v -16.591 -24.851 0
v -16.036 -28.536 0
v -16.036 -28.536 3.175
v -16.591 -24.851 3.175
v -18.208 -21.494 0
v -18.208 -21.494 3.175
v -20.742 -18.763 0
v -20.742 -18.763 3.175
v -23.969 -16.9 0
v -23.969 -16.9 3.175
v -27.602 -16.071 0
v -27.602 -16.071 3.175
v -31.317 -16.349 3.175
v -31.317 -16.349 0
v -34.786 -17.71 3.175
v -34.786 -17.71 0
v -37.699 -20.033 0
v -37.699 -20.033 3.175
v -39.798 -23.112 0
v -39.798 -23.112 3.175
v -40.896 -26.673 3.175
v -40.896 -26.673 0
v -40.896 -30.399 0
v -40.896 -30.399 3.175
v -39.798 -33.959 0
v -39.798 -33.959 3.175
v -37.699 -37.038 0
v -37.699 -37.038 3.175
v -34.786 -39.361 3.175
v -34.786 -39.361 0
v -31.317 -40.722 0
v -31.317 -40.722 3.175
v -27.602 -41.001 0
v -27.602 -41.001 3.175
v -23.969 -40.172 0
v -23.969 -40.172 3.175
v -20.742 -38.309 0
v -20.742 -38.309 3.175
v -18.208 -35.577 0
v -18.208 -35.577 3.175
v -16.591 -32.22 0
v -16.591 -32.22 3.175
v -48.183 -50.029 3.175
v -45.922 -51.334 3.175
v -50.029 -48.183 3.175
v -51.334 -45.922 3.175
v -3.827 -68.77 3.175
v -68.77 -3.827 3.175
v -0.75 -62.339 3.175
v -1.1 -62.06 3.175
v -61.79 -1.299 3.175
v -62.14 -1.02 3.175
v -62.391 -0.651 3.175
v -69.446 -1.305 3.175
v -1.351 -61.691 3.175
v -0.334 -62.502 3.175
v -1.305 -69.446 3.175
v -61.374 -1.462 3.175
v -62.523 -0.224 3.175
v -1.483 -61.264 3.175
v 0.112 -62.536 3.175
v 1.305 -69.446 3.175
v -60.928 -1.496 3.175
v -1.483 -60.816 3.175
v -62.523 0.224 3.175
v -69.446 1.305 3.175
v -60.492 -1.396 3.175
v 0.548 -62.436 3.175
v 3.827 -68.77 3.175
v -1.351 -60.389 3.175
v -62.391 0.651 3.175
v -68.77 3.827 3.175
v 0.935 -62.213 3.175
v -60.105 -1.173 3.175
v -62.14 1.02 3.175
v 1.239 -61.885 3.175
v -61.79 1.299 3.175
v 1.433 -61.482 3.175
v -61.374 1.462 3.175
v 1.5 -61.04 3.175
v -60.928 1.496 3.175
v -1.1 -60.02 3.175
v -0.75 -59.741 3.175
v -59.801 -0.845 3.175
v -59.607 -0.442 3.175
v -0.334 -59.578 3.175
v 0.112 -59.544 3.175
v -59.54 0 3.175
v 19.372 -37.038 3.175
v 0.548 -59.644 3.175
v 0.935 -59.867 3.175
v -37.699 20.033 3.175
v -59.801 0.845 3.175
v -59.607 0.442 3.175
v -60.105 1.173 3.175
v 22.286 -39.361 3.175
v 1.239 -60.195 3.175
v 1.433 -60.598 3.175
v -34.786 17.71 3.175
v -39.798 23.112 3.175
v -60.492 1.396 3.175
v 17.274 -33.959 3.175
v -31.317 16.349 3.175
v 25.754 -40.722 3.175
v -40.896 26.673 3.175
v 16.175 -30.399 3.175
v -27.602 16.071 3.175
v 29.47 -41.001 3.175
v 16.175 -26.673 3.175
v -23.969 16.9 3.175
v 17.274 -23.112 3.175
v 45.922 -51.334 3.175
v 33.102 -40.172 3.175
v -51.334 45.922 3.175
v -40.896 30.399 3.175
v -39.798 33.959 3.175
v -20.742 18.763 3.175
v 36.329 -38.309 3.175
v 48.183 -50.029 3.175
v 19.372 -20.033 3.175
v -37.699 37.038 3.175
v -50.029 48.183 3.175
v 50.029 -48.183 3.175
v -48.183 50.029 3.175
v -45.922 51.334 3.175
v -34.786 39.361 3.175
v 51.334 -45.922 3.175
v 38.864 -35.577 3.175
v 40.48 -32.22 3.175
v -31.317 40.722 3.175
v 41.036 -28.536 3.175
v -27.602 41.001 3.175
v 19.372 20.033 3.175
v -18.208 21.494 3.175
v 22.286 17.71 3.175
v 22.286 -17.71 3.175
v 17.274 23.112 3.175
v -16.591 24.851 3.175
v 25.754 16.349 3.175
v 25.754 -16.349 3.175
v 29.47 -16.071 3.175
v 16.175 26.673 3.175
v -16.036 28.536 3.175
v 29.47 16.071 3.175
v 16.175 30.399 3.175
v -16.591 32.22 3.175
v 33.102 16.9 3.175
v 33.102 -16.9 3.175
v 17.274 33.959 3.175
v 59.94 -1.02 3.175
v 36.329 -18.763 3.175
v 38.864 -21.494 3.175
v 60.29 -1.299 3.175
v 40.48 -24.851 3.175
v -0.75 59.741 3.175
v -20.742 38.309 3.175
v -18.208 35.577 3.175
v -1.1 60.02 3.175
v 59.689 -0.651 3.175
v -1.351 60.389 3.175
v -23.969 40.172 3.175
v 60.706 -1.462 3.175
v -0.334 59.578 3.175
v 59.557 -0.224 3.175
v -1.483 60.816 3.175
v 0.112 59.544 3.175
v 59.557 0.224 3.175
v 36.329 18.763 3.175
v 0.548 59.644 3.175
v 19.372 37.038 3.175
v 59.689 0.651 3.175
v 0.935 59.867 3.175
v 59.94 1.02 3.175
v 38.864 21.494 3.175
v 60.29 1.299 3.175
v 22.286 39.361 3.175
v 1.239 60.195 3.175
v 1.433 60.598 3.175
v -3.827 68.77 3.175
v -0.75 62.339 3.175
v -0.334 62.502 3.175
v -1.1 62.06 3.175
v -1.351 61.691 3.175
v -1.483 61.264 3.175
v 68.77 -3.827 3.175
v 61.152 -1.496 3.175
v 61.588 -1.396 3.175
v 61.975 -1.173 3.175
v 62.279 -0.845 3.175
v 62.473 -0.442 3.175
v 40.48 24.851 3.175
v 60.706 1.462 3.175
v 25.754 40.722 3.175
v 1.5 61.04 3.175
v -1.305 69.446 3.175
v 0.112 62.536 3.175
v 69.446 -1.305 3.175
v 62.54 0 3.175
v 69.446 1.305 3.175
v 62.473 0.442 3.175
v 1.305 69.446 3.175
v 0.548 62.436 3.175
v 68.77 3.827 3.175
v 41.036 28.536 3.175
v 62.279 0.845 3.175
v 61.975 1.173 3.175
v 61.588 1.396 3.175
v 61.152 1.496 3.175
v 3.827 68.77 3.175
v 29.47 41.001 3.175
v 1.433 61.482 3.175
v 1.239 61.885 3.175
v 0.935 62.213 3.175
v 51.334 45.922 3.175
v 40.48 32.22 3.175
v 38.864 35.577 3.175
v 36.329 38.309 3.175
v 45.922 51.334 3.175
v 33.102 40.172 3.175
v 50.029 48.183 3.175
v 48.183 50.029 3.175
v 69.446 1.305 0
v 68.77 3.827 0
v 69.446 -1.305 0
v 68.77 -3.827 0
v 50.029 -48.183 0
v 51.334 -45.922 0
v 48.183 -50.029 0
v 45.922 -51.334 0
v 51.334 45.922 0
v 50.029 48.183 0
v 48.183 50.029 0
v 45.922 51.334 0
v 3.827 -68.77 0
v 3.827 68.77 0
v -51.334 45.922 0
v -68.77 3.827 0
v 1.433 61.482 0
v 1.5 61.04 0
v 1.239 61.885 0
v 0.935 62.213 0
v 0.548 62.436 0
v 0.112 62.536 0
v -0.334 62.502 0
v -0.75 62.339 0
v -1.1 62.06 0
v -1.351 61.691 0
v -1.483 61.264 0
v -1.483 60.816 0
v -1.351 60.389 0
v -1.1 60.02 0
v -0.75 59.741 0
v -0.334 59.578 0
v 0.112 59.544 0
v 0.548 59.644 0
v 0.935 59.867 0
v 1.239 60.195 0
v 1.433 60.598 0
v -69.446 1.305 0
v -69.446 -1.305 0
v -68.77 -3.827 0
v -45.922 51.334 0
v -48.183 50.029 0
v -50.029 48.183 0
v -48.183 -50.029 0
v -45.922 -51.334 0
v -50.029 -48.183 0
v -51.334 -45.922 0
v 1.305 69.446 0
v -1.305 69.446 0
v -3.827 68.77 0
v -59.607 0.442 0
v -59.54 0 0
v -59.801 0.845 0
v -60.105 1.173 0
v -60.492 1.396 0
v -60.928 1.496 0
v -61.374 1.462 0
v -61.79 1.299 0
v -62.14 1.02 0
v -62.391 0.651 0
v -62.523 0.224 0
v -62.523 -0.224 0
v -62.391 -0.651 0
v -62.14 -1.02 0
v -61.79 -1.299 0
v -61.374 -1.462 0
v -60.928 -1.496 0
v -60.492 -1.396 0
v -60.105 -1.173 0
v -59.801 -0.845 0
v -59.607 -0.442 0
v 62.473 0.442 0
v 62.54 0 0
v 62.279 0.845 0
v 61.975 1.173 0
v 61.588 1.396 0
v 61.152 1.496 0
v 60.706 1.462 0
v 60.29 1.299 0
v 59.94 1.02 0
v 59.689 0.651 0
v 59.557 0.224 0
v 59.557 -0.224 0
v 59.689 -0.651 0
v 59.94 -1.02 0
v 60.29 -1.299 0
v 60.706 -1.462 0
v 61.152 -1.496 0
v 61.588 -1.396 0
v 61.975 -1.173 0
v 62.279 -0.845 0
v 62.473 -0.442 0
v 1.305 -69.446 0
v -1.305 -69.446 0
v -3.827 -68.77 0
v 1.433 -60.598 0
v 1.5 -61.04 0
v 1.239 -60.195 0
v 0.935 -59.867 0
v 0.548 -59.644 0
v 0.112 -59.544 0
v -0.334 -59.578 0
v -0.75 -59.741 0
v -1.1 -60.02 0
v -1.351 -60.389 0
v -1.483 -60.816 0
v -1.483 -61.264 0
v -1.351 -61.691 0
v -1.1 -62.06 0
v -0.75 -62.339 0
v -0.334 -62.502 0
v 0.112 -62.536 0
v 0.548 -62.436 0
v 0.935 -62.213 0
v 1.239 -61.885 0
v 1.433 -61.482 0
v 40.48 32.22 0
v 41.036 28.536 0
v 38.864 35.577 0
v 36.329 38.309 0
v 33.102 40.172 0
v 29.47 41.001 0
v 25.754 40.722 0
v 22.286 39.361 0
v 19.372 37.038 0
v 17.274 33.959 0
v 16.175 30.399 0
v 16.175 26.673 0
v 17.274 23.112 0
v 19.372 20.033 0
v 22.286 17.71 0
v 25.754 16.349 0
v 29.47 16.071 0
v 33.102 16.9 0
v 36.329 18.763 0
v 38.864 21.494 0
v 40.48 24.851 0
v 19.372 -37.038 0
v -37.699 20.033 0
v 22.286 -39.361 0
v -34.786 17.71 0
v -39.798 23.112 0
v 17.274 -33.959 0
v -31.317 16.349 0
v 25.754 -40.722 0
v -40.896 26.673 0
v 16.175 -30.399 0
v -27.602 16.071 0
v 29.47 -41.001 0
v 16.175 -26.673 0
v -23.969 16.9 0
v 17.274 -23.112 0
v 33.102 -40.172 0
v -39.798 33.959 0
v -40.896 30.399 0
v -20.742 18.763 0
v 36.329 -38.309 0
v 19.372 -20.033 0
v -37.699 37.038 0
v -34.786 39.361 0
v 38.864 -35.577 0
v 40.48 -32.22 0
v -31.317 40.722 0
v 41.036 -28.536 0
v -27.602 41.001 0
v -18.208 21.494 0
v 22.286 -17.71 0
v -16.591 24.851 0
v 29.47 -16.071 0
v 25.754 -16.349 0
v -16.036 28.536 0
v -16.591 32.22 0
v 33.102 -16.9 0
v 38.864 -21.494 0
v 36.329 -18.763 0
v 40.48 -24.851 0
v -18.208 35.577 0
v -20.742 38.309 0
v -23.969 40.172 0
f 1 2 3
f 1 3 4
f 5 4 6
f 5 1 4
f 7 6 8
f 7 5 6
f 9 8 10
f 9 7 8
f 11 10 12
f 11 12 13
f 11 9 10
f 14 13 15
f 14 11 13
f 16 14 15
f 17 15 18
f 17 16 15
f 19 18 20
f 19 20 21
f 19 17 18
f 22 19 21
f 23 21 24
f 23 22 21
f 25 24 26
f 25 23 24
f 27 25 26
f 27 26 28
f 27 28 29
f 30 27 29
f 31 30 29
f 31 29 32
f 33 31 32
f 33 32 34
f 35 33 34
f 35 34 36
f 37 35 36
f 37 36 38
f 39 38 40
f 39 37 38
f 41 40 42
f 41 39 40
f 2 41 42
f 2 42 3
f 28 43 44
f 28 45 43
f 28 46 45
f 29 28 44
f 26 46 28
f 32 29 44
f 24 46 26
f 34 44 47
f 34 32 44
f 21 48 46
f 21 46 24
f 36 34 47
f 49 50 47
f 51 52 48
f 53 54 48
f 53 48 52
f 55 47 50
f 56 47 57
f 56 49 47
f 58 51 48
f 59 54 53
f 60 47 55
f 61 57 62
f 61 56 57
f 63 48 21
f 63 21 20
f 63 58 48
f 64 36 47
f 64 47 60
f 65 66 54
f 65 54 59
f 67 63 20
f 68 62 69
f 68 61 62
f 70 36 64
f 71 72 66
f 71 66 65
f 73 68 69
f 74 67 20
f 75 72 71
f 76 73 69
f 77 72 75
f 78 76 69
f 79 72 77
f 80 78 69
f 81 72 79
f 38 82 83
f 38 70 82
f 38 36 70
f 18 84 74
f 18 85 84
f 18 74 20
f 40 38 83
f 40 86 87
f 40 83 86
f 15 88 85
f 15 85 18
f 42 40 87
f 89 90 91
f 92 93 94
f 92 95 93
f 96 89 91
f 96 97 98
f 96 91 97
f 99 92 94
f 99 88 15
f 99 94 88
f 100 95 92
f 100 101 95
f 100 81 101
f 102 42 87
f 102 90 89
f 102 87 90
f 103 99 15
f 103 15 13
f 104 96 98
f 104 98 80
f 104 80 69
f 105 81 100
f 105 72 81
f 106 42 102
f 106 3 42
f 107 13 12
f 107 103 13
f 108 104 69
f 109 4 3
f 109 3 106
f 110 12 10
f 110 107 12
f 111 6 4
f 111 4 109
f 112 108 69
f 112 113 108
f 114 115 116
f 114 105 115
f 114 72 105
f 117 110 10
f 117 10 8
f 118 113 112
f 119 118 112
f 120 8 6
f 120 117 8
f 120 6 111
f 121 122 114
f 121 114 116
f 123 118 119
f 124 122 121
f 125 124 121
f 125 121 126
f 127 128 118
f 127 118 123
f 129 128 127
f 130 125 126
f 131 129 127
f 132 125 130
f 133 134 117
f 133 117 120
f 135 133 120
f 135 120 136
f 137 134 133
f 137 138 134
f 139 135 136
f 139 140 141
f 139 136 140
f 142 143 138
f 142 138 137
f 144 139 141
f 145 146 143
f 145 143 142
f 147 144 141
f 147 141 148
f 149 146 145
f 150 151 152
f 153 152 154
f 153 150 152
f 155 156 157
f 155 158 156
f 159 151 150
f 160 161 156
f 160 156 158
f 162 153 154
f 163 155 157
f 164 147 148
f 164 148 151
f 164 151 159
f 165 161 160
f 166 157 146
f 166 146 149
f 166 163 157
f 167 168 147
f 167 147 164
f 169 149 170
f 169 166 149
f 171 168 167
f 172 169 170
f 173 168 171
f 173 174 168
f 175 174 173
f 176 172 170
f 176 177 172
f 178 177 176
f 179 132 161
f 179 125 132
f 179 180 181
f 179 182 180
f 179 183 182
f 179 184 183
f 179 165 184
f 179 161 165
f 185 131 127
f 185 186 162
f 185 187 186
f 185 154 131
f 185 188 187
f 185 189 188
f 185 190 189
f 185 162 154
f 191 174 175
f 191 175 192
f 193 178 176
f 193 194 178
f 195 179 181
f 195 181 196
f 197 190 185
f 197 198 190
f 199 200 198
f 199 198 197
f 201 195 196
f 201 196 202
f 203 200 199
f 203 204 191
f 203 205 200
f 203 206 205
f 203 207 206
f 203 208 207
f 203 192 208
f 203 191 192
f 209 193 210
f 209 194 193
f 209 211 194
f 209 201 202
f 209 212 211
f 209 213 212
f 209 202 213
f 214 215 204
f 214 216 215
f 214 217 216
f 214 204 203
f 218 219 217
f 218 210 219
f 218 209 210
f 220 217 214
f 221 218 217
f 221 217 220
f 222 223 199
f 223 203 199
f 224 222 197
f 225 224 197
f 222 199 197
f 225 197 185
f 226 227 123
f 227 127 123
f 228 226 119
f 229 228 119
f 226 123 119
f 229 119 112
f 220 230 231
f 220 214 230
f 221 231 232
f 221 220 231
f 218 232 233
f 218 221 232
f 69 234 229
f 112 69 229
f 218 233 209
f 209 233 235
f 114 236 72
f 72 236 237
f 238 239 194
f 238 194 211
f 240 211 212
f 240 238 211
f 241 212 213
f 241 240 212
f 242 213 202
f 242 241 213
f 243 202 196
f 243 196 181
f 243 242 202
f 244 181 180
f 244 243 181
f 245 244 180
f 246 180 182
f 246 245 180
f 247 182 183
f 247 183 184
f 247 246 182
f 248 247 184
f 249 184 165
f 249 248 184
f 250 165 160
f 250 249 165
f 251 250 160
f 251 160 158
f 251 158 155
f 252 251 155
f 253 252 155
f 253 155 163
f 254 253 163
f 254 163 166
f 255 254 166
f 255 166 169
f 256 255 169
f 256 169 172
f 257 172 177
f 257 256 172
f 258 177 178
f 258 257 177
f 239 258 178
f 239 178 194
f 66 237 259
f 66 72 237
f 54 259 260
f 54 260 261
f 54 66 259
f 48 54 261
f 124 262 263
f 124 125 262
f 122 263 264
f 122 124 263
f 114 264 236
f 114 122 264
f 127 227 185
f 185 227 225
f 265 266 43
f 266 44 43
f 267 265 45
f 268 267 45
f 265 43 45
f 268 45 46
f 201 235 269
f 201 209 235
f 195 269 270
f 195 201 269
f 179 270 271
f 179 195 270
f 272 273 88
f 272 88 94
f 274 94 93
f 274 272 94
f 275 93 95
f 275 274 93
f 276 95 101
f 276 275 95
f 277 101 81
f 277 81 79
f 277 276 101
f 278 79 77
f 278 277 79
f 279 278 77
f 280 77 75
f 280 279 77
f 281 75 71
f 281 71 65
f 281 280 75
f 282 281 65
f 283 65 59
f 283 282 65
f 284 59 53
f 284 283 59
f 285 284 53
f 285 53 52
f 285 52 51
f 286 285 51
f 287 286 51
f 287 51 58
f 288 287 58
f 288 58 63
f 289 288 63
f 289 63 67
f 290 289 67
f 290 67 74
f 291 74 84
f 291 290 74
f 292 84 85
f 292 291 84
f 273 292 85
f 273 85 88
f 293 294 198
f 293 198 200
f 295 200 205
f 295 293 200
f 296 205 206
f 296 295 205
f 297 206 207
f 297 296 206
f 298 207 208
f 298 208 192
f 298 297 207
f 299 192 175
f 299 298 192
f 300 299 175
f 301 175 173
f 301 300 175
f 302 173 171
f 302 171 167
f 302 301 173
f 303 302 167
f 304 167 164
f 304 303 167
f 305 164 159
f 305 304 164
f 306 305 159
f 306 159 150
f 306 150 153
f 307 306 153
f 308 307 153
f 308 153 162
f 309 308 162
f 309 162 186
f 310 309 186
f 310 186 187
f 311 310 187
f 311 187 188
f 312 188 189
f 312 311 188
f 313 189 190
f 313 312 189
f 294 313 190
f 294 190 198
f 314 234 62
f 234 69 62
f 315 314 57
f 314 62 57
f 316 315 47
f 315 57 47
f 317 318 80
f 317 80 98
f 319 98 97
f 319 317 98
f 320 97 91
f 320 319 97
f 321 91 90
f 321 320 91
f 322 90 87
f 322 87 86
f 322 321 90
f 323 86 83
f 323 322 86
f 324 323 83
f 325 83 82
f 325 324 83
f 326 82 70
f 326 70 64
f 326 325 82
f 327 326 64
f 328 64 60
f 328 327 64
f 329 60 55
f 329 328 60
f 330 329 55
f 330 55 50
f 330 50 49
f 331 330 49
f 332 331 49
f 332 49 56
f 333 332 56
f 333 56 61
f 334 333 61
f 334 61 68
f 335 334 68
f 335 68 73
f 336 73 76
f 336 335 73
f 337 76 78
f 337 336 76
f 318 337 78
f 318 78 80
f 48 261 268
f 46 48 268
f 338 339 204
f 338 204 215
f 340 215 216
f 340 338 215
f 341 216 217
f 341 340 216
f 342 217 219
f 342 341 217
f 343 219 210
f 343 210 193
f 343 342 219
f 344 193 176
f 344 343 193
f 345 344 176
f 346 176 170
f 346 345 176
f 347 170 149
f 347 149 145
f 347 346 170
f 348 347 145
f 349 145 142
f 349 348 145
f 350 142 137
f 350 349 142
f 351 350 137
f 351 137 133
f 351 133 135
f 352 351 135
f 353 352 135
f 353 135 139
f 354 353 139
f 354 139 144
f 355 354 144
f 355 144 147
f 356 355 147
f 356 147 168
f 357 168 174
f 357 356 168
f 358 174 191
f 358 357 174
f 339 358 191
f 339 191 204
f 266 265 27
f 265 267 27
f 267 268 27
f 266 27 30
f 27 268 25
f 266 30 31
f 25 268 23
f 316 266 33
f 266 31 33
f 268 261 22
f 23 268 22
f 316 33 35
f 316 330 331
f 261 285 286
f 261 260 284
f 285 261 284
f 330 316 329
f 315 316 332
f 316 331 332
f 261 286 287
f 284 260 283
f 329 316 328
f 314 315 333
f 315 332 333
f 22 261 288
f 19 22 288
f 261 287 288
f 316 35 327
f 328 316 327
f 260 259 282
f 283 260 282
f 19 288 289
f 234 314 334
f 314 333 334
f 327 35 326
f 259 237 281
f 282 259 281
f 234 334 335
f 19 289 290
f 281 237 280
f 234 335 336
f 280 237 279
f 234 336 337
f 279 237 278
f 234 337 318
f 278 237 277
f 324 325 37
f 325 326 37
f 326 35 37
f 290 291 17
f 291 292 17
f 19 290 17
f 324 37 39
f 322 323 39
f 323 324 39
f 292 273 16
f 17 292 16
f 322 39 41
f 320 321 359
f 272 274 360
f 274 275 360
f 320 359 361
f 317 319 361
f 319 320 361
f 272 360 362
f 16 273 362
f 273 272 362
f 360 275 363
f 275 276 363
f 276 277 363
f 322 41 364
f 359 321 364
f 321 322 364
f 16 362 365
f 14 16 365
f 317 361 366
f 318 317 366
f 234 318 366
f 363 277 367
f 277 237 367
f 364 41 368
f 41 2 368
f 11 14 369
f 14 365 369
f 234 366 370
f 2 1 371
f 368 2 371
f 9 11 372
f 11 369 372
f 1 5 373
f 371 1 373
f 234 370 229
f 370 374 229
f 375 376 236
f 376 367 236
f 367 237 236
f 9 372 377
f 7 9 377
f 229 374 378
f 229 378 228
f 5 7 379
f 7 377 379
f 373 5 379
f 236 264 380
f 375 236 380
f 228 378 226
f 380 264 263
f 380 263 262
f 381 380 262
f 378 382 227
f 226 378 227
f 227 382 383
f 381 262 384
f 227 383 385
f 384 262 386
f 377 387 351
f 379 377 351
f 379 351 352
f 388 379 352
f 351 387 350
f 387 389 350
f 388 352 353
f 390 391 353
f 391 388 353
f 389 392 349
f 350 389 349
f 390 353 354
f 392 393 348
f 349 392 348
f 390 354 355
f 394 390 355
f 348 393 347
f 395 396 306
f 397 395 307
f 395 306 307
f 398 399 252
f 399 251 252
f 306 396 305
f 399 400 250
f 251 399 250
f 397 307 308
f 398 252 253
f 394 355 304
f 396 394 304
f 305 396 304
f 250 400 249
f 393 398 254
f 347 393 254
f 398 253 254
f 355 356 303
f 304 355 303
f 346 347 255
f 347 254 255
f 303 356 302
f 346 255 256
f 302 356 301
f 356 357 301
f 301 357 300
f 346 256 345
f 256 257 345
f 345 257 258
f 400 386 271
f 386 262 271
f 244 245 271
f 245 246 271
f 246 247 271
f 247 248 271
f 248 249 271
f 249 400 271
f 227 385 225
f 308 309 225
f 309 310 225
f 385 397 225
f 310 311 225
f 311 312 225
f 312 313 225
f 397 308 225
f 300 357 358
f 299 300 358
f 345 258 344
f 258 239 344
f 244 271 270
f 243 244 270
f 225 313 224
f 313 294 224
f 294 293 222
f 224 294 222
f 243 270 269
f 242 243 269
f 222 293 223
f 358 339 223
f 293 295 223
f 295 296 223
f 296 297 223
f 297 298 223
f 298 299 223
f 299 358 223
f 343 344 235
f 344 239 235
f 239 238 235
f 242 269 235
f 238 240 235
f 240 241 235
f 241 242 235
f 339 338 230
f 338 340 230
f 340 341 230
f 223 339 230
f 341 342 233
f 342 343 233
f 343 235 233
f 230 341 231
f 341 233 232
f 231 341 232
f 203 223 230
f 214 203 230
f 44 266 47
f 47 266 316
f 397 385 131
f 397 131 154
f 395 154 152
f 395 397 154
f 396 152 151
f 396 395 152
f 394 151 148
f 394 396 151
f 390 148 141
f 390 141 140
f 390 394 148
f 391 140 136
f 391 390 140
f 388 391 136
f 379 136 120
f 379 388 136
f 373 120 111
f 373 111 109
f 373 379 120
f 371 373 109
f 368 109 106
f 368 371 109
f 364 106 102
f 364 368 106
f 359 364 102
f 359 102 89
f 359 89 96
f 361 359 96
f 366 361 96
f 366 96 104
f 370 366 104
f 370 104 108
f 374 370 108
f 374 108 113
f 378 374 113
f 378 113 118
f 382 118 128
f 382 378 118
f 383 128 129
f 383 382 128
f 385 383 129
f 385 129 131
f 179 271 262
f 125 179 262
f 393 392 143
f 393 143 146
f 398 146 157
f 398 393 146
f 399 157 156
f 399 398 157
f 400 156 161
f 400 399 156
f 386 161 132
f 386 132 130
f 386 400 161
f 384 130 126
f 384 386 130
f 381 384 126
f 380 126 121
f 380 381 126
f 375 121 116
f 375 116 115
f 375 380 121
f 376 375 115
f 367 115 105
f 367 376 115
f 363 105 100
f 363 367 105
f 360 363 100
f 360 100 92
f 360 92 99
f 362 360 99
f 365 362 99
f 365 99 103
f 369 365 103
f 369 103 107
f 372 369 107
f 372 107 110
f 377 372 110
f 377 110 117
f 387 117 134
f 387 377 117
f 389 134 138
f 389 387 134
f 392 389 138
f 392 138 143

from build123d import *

# Parameters (mm, degrees)
SKETCH1_R           = 1.5
SKETCH1_R_2         = 12.5
BOSS_EXTRUDE1_DEPTH = 3.175
FILLET1_R           = 10
FILLET2_R           = 10


with BuildPart() as part:
    # Sketch1 → Boss-Extrude1 (new body)
    with BuildSketch(Plane.XY):
        Polygon((70.355493019, 0), (49.748846207, 49.748846207), (0, 70.355493019), (-49.748846207, 49.748846207), (-70.355493019, 0), (-49.748846207, -49.748846207), (0, -70.355493019), (49.748846207, -49.748846207), align=None)
        with Locations((0, 61.04)):
            Circle(SKETCH1_R, mode=Mode.SUBTRACT)
        with Locations((61.04, 0)):
            Circle(SKETCH1_R, mode=Mode.SUBTRACT)
        with Locations((0, -61.04)):
            Circle(SKETCH1_R, mode=Mode.SUBTRACT)
        with Locations((-61.04, 0)):
            Circle(SKETCH1_R, mode=Mode.SUBTRACT)
        with Locations((-28.535642772, 28.535642772)):
            Circle(SKETCH1_R_2, mode=Mode.SUBTRACT)
        with Locations((28.535642772, 28.535642772)):
            Circle(SKETCH1_R_2, mode=Mode.SUBTRACT)
        with Locations((-28.535642772, -28.535642772)):
            Circle(SKETCH1_R_2, mode=Mode.SUBTRACT)
        with Locations((28.535642772, -28.535642772)):
            Circle(SKETCH1_R_2, mode=Mode.SUBTRACT)
    extrude(amount=BOSS_EXTRUDE1_DEPTH)

    # Fillet1
    fillet1_edges = [part.edges().sort_by_distance(p)[0] for p in [
        (49.748846207, -49.748846207, 1.5875),
        (0, -70.355493019, 1.5875),
        (-49.748846207, -49.748846207, 1.5875),
        (-70.355493019, 0, 1.5875),
        (0, 70.355493019, 1.5875),
        (49.748846207, 49.748846207, 1.5875),
        (70.355493019, 0, 1.5875),
    ]]
    fillet(fillet1_edges, radius=FILLET1_R)

    # Fillet2
    fillet2_edges = [part.edges().sort_by_distance(p)[0] for p in [
        (-49.748846207, 49.748846207, 1.5875),
    ]]
    fillet(fillet2_edges, radius=FILLET2_R)


solid = part.part
